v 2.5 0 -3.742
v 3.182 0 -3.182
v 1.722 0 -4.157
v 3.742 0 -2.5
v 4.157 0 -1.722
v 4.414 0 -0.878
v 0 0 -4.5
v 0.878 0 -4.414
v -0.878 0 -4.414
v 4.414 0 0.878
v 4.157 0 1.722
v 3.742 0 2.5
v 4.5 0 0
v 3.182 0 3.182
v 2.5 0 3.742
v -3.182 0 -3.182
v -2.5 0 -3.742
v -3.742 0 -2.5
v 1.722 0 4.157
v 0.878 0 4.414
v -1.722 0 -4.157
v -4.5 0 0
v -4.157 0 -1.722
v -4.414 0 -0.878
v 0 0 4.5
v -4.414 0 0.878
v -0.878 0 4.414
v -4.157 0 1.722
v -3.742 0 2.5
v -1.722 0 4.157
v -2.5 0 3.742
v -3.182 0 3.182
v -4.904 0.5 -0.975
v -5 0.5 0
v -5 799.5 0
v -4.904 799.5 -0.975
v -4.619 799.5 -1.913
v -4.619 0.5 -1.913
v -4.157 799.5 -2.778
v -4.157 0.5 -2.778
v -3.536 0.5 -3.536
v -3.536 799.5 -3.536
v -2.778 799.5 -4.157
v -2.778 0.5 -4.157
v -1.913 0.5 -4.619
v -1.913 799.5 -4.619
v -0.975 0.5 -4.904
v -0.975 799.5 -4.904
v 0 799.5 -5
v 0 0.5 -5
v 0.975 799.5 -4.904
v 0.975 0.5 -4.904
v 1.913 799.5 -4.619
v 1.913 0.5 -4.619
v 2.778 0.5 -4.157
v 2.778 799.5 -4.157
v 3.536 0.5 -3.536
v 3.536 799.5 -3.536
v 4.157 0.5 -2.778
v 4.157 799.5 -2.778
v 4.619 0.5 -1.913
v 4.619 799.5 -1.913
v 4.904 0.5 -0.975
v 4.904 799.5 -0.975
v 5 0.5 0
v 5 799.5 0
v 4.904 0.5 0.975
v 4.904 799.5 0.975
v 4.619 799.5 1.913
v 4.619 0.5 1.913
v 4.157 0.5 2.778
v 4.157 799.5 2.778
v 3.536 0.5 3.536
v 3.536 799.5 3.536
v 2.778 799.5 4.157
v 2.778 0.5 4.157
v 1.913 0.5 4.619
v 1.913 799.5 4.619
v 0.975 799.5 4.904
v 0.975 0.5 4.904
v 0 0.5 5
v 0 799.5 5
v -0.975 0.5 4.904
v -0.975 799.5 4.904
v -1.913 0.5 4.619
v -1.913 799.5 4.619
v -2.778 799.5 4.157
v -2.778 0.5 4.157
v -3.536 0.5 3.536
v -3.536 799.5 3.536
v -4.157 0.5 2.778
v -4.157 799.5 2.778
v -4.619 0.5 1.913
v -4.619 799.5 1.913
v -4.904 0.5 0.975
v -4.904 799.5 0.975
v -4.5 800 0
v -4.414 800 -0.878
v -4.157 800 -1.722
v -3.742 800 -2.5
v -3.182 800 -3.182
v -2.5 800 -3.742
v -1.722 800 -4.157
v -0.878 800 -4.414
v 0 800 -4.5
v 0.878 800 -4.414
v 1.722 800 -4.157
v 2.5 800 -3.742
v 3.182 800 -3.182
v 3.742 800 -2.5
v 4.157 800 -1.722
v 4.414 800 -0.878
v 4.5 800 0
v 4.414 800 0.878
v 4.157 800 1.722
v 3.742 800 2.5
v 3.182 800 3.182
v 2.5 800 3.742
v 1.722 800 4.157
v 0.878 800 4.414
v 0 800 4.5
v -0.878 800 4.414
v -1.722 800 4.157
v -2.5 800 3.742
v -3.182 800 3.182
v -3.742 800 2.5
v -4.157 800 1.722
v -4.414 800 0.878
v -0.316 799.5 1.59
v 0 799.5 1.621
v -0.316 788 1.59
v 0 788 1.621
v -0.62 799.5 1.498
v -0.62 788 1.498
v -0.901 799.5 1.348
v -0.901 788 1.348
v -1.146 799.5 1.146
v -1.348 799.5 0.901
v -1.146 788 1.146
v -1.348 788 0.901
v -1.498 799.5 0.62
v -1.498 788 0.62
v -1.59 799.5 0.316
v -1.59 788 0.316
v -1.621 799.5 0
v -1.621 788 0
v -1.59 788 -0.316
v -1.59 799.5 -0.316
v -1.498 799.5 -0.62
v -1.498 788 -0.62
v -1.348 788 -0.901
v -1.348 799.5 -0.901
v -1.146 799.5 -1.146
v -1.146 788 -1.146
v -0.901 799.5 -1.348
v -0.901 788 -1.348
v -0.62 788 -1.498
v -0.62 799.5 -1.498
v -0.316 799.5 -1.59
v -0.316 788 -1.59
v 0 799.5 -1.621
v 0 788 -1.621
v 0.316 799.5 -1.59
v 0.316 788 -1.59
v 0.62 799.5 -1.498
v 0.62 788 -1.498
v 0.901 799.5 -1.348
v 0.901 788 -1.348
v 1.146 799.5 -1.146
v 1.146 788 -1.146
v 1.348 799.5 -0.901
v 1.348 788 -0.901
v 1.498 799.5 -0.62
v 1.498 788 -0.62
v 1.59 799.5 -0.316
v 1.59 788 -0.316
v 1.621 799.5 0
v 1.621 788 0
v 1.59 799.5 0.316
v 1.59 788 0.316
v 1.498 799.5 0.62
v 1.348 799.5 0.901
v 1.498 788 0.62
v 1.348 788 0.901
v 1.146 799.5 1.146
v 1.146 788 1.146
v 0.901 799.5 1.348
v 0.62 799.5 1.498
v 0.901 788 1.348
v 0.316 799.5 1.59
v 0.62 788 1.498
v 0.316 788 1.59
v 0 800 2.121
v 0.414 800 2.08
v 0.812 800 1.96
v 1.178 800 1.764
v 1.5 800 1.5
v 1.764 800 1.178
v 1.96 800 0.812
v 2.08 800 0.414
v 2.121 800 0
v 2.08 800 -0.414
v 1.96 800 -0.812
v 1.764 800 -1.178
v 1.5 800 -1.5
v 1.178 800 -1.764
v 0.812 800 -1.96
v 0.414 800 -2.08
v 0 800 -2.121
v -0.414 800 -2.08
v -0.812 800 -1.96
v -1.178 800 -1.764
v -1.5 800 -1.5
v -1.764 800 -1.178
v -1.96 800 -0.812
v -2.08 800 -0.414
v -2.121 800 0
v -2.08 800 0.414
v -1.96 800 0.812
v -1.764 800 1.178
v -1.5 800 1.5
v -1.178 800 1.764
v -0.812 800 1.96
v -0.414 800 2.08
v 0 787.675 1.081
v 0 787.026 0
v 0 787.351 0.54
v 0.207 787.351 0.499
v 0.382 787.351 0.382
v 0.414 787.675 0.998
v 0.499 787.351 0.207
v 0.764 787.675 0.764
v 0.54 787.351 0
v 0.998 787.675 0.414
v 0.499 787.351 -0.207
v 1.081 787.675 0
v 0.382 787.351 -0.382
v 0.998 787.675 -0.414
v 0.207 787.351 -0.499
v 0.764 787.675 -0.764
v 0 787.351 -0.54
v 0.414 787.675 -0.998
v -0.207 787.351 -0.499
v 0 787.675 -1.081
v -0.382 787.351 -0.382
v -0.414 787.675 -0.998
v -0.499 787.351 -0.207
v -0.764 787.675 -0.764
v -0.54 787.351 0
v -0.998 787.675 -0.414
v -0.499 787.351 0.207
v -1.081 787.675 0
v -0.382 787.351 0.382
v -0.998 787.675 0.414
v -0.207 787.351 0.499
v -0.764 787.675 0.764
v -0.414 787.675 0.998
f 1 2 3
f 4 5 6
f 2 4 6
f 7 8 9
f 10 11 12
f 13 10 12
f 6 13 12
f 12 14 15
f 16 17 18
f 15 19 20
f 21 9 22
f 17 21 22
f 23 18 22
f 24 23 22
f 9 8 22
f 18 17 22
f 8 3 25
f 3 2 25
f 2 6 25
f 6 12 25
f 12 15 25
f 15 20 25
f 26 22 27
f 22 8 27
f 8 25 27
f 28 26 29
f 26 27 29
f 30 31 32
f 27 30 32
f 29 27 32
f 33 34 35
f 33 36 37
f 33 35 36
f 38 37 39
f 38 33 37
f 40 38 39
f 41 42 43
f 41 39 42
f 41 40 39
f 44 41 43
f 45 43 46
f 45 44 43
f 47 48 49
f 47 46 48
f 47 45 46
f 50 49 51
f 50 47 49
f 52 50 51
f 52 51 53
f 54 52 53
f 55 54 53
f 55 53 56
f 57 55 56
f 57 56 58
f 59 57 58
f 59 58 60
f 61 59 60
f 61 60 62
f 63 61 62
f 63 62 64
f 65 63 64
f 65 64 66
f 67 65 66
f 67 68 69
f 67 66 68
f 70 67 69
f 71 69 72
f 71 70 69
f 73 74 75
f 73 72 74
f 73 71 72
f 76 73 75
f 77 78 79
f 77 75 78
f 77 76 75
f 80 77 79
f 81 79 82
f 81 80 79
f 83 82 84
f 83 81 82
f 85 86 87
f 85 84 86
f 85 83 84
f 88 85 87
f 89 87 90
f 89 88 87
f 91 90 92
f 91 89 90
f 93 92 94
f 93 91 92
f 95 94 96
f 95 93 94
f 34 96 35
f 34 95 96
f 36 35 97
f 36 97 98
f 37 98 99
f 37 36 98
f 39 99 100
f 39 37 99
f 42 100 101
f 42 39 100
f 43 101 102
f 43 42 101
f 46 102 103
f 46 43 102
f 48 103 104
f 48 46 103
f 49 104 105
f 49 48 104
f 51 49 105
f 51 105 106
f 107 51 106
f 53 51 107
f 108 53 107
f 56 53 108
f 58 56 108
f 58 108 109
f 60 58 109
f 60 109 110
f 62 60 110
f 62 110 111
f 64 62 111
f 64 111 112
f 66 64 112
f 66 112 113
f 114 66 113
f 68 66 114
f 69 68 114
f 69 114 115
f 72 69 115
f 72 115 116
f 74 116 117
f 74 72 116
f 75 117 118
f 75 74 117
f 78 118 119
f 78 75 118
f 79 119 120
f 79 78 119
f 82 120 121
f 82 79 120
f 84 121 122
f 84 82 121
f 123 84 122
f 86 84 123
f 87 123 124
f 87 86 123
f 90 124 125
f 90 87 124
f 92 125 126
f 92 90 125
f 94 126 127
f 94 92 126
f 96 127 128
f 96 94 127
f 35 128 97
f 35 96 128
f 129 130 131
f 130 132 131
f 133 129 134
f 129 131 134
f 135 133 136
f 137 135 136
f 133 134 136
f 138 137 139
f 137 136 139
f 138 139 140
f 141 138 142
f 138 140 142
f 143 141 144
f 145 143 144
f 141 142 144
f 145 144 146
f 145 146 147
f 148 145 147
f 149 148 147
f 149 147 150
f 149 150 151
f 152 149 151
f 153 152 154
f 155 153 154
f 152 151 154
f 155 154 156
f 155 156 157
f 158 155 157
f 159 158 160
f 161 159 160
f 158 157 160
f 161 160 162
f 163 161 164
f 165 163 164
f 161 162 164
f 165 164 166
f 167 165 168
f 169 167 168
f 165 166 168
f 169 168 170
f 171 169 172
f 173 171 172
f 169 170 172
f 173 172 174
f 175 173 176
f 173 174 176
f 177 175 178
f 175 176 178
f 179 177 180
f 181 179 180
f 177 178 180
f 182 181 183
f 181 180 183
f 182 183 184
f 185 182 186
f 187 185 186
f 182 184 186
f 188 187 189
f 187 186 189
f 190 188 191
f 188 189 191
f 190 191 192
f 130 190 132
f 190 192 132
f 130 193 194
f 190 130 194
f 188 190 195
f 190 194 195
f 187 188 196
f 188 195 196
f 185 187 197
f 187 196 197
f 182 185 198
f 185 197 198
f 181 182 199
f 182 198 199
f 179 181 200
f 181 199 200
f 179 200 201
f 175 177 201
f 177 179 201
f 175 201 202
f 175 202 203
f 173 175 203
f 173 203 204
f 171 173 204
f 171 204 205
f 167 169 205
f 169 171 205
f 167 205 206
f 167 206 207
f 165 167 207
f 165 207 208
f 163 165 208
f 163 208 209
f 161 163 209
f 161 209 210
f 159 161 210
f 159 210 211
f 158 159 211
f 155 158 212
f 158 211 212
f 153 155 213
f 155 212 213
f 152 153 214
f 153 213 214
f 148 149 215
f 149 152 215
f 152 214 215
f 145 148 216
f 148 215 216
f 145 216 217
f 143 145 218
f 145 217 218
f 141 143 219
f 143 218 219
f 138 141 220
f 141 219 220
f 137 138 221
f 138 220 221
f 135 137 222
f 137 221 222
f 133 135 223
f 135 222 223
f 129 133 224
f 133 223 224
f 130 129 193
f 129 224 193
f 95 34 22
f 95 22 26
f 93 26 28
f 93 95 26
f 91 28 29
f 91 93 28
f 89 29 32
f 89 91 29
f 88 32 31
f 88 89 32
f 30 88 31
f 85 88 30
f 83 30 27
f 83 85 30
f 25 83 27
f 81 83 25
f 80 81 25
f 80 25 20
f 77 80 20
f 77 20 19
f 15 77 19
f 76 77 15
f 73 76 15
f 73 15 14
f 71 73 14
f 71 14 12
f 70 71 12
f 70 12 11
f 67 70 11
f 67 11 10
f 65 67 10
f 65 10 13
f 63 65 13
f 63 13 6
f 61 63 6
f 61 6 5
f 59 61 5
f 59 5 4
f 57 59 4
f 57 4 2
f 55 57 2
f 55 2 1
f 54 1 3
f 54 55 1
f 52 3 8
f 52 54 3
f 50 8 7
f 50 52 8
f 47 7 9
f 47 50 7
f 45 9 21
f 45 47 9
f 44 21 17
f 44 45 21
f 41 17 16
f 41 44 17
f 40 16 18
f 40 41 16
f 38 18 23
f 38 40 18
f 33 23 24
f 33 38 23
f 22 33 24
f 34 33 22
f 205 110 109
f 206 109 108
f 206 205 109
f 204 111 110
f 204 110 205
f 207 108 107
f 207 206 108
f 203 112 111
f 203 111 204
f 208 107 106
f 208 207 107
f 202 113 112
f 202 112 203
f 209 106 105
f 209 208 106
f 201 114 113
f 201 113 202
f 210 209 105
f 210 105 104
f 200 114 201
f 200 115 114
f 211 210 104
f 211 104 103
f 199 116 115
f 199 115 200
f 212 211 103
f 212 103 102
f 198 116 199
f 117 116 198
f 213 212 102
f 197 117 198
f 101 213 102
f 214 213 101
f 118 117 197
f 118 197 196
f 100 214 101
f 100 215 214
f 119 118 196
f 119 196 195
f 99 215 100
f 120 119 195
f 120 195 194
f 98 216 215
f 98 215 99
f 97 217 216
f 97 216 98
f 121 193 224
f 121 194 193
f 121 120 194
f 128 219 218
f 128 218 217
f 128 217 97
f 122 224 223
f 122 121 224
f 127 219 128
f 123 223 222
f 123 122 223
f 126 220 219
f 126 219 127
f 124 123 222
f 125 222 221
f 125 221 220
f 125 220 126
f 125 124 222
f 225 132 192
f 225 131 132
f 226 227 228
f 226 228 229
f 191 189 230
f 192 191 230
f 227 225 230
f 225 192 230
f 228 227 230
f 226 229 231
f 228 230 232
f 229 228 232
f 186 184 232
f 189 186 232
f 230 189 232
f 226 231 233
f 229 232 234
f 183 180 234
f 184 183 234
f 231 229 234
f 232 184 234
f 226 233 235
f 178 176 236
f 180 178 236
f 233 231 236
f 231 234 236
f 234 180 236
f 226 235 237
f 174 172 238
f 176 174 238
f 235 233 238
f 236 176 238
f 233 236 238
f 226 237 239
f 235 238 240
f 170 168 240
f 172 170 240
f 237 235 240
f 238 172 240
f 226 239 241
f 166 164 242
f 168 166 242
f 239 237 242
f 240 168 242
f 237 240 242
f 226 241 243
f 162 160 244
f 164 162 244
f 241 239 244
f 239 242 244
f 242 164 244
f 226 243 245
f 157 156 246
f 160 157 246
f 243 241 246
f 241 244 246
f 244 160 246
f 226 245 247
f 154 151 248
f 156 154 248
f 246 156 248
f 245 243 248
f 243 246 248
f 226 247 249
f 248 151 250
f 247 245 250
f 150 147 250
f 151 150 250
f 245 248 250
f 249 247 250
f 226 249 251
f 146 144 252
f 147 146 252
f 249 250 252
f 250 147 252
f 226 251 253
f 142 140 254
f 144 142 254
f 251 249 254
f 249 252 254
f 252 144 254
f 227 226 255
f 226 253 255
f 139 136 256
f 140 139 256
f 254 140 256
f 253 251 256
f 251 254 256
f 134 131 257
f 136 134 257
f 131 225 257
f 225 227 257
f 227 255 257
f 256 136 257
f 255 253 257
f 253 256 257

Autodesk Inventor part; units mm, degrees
ref_plane "YZ Plane" through (0, 0, 0) normal (1, 0, 0) x (0, 1, 0)
ref_plane "XZ Plane" through (0, 0, 0) normal (0, 1, 0) x (-1, 0, 0)
ref_plane "XY Plane" through (0, 0, 0) normal (0, 0, 1) x (1, 0, 0)
sketch "Sketch1" plane through (0, 0, 0) normal (0, 1, 0) x (-1, 0, 0)
  circle A0 centre (0, 0) radius 5
  dimension "d0" = 10
extrude "Extrusion1" add sketch "Sketch1" along normal blind 800
sketch "Sketch2" plane through (0, 800, 0) normal (0, 1, 0) x (1, 0, 0)
  point P0 (0, 0)
  point P1 (0, 0)
hole "Hole1" at (0, 800, 0) direction (0, -1, 0) diameter 3.242 depth 12 tip angle 118 thread size "M4x0.7" class "6H" standard "ISO Metric profile"
chamfer "Chamfer1" distance 0.5 angle 45 3 edges at (0, 800, -1.621) (5, 800, 0) (5, 0, 0)
properties part number "CUT_ALU_10x800mm_Rod"
